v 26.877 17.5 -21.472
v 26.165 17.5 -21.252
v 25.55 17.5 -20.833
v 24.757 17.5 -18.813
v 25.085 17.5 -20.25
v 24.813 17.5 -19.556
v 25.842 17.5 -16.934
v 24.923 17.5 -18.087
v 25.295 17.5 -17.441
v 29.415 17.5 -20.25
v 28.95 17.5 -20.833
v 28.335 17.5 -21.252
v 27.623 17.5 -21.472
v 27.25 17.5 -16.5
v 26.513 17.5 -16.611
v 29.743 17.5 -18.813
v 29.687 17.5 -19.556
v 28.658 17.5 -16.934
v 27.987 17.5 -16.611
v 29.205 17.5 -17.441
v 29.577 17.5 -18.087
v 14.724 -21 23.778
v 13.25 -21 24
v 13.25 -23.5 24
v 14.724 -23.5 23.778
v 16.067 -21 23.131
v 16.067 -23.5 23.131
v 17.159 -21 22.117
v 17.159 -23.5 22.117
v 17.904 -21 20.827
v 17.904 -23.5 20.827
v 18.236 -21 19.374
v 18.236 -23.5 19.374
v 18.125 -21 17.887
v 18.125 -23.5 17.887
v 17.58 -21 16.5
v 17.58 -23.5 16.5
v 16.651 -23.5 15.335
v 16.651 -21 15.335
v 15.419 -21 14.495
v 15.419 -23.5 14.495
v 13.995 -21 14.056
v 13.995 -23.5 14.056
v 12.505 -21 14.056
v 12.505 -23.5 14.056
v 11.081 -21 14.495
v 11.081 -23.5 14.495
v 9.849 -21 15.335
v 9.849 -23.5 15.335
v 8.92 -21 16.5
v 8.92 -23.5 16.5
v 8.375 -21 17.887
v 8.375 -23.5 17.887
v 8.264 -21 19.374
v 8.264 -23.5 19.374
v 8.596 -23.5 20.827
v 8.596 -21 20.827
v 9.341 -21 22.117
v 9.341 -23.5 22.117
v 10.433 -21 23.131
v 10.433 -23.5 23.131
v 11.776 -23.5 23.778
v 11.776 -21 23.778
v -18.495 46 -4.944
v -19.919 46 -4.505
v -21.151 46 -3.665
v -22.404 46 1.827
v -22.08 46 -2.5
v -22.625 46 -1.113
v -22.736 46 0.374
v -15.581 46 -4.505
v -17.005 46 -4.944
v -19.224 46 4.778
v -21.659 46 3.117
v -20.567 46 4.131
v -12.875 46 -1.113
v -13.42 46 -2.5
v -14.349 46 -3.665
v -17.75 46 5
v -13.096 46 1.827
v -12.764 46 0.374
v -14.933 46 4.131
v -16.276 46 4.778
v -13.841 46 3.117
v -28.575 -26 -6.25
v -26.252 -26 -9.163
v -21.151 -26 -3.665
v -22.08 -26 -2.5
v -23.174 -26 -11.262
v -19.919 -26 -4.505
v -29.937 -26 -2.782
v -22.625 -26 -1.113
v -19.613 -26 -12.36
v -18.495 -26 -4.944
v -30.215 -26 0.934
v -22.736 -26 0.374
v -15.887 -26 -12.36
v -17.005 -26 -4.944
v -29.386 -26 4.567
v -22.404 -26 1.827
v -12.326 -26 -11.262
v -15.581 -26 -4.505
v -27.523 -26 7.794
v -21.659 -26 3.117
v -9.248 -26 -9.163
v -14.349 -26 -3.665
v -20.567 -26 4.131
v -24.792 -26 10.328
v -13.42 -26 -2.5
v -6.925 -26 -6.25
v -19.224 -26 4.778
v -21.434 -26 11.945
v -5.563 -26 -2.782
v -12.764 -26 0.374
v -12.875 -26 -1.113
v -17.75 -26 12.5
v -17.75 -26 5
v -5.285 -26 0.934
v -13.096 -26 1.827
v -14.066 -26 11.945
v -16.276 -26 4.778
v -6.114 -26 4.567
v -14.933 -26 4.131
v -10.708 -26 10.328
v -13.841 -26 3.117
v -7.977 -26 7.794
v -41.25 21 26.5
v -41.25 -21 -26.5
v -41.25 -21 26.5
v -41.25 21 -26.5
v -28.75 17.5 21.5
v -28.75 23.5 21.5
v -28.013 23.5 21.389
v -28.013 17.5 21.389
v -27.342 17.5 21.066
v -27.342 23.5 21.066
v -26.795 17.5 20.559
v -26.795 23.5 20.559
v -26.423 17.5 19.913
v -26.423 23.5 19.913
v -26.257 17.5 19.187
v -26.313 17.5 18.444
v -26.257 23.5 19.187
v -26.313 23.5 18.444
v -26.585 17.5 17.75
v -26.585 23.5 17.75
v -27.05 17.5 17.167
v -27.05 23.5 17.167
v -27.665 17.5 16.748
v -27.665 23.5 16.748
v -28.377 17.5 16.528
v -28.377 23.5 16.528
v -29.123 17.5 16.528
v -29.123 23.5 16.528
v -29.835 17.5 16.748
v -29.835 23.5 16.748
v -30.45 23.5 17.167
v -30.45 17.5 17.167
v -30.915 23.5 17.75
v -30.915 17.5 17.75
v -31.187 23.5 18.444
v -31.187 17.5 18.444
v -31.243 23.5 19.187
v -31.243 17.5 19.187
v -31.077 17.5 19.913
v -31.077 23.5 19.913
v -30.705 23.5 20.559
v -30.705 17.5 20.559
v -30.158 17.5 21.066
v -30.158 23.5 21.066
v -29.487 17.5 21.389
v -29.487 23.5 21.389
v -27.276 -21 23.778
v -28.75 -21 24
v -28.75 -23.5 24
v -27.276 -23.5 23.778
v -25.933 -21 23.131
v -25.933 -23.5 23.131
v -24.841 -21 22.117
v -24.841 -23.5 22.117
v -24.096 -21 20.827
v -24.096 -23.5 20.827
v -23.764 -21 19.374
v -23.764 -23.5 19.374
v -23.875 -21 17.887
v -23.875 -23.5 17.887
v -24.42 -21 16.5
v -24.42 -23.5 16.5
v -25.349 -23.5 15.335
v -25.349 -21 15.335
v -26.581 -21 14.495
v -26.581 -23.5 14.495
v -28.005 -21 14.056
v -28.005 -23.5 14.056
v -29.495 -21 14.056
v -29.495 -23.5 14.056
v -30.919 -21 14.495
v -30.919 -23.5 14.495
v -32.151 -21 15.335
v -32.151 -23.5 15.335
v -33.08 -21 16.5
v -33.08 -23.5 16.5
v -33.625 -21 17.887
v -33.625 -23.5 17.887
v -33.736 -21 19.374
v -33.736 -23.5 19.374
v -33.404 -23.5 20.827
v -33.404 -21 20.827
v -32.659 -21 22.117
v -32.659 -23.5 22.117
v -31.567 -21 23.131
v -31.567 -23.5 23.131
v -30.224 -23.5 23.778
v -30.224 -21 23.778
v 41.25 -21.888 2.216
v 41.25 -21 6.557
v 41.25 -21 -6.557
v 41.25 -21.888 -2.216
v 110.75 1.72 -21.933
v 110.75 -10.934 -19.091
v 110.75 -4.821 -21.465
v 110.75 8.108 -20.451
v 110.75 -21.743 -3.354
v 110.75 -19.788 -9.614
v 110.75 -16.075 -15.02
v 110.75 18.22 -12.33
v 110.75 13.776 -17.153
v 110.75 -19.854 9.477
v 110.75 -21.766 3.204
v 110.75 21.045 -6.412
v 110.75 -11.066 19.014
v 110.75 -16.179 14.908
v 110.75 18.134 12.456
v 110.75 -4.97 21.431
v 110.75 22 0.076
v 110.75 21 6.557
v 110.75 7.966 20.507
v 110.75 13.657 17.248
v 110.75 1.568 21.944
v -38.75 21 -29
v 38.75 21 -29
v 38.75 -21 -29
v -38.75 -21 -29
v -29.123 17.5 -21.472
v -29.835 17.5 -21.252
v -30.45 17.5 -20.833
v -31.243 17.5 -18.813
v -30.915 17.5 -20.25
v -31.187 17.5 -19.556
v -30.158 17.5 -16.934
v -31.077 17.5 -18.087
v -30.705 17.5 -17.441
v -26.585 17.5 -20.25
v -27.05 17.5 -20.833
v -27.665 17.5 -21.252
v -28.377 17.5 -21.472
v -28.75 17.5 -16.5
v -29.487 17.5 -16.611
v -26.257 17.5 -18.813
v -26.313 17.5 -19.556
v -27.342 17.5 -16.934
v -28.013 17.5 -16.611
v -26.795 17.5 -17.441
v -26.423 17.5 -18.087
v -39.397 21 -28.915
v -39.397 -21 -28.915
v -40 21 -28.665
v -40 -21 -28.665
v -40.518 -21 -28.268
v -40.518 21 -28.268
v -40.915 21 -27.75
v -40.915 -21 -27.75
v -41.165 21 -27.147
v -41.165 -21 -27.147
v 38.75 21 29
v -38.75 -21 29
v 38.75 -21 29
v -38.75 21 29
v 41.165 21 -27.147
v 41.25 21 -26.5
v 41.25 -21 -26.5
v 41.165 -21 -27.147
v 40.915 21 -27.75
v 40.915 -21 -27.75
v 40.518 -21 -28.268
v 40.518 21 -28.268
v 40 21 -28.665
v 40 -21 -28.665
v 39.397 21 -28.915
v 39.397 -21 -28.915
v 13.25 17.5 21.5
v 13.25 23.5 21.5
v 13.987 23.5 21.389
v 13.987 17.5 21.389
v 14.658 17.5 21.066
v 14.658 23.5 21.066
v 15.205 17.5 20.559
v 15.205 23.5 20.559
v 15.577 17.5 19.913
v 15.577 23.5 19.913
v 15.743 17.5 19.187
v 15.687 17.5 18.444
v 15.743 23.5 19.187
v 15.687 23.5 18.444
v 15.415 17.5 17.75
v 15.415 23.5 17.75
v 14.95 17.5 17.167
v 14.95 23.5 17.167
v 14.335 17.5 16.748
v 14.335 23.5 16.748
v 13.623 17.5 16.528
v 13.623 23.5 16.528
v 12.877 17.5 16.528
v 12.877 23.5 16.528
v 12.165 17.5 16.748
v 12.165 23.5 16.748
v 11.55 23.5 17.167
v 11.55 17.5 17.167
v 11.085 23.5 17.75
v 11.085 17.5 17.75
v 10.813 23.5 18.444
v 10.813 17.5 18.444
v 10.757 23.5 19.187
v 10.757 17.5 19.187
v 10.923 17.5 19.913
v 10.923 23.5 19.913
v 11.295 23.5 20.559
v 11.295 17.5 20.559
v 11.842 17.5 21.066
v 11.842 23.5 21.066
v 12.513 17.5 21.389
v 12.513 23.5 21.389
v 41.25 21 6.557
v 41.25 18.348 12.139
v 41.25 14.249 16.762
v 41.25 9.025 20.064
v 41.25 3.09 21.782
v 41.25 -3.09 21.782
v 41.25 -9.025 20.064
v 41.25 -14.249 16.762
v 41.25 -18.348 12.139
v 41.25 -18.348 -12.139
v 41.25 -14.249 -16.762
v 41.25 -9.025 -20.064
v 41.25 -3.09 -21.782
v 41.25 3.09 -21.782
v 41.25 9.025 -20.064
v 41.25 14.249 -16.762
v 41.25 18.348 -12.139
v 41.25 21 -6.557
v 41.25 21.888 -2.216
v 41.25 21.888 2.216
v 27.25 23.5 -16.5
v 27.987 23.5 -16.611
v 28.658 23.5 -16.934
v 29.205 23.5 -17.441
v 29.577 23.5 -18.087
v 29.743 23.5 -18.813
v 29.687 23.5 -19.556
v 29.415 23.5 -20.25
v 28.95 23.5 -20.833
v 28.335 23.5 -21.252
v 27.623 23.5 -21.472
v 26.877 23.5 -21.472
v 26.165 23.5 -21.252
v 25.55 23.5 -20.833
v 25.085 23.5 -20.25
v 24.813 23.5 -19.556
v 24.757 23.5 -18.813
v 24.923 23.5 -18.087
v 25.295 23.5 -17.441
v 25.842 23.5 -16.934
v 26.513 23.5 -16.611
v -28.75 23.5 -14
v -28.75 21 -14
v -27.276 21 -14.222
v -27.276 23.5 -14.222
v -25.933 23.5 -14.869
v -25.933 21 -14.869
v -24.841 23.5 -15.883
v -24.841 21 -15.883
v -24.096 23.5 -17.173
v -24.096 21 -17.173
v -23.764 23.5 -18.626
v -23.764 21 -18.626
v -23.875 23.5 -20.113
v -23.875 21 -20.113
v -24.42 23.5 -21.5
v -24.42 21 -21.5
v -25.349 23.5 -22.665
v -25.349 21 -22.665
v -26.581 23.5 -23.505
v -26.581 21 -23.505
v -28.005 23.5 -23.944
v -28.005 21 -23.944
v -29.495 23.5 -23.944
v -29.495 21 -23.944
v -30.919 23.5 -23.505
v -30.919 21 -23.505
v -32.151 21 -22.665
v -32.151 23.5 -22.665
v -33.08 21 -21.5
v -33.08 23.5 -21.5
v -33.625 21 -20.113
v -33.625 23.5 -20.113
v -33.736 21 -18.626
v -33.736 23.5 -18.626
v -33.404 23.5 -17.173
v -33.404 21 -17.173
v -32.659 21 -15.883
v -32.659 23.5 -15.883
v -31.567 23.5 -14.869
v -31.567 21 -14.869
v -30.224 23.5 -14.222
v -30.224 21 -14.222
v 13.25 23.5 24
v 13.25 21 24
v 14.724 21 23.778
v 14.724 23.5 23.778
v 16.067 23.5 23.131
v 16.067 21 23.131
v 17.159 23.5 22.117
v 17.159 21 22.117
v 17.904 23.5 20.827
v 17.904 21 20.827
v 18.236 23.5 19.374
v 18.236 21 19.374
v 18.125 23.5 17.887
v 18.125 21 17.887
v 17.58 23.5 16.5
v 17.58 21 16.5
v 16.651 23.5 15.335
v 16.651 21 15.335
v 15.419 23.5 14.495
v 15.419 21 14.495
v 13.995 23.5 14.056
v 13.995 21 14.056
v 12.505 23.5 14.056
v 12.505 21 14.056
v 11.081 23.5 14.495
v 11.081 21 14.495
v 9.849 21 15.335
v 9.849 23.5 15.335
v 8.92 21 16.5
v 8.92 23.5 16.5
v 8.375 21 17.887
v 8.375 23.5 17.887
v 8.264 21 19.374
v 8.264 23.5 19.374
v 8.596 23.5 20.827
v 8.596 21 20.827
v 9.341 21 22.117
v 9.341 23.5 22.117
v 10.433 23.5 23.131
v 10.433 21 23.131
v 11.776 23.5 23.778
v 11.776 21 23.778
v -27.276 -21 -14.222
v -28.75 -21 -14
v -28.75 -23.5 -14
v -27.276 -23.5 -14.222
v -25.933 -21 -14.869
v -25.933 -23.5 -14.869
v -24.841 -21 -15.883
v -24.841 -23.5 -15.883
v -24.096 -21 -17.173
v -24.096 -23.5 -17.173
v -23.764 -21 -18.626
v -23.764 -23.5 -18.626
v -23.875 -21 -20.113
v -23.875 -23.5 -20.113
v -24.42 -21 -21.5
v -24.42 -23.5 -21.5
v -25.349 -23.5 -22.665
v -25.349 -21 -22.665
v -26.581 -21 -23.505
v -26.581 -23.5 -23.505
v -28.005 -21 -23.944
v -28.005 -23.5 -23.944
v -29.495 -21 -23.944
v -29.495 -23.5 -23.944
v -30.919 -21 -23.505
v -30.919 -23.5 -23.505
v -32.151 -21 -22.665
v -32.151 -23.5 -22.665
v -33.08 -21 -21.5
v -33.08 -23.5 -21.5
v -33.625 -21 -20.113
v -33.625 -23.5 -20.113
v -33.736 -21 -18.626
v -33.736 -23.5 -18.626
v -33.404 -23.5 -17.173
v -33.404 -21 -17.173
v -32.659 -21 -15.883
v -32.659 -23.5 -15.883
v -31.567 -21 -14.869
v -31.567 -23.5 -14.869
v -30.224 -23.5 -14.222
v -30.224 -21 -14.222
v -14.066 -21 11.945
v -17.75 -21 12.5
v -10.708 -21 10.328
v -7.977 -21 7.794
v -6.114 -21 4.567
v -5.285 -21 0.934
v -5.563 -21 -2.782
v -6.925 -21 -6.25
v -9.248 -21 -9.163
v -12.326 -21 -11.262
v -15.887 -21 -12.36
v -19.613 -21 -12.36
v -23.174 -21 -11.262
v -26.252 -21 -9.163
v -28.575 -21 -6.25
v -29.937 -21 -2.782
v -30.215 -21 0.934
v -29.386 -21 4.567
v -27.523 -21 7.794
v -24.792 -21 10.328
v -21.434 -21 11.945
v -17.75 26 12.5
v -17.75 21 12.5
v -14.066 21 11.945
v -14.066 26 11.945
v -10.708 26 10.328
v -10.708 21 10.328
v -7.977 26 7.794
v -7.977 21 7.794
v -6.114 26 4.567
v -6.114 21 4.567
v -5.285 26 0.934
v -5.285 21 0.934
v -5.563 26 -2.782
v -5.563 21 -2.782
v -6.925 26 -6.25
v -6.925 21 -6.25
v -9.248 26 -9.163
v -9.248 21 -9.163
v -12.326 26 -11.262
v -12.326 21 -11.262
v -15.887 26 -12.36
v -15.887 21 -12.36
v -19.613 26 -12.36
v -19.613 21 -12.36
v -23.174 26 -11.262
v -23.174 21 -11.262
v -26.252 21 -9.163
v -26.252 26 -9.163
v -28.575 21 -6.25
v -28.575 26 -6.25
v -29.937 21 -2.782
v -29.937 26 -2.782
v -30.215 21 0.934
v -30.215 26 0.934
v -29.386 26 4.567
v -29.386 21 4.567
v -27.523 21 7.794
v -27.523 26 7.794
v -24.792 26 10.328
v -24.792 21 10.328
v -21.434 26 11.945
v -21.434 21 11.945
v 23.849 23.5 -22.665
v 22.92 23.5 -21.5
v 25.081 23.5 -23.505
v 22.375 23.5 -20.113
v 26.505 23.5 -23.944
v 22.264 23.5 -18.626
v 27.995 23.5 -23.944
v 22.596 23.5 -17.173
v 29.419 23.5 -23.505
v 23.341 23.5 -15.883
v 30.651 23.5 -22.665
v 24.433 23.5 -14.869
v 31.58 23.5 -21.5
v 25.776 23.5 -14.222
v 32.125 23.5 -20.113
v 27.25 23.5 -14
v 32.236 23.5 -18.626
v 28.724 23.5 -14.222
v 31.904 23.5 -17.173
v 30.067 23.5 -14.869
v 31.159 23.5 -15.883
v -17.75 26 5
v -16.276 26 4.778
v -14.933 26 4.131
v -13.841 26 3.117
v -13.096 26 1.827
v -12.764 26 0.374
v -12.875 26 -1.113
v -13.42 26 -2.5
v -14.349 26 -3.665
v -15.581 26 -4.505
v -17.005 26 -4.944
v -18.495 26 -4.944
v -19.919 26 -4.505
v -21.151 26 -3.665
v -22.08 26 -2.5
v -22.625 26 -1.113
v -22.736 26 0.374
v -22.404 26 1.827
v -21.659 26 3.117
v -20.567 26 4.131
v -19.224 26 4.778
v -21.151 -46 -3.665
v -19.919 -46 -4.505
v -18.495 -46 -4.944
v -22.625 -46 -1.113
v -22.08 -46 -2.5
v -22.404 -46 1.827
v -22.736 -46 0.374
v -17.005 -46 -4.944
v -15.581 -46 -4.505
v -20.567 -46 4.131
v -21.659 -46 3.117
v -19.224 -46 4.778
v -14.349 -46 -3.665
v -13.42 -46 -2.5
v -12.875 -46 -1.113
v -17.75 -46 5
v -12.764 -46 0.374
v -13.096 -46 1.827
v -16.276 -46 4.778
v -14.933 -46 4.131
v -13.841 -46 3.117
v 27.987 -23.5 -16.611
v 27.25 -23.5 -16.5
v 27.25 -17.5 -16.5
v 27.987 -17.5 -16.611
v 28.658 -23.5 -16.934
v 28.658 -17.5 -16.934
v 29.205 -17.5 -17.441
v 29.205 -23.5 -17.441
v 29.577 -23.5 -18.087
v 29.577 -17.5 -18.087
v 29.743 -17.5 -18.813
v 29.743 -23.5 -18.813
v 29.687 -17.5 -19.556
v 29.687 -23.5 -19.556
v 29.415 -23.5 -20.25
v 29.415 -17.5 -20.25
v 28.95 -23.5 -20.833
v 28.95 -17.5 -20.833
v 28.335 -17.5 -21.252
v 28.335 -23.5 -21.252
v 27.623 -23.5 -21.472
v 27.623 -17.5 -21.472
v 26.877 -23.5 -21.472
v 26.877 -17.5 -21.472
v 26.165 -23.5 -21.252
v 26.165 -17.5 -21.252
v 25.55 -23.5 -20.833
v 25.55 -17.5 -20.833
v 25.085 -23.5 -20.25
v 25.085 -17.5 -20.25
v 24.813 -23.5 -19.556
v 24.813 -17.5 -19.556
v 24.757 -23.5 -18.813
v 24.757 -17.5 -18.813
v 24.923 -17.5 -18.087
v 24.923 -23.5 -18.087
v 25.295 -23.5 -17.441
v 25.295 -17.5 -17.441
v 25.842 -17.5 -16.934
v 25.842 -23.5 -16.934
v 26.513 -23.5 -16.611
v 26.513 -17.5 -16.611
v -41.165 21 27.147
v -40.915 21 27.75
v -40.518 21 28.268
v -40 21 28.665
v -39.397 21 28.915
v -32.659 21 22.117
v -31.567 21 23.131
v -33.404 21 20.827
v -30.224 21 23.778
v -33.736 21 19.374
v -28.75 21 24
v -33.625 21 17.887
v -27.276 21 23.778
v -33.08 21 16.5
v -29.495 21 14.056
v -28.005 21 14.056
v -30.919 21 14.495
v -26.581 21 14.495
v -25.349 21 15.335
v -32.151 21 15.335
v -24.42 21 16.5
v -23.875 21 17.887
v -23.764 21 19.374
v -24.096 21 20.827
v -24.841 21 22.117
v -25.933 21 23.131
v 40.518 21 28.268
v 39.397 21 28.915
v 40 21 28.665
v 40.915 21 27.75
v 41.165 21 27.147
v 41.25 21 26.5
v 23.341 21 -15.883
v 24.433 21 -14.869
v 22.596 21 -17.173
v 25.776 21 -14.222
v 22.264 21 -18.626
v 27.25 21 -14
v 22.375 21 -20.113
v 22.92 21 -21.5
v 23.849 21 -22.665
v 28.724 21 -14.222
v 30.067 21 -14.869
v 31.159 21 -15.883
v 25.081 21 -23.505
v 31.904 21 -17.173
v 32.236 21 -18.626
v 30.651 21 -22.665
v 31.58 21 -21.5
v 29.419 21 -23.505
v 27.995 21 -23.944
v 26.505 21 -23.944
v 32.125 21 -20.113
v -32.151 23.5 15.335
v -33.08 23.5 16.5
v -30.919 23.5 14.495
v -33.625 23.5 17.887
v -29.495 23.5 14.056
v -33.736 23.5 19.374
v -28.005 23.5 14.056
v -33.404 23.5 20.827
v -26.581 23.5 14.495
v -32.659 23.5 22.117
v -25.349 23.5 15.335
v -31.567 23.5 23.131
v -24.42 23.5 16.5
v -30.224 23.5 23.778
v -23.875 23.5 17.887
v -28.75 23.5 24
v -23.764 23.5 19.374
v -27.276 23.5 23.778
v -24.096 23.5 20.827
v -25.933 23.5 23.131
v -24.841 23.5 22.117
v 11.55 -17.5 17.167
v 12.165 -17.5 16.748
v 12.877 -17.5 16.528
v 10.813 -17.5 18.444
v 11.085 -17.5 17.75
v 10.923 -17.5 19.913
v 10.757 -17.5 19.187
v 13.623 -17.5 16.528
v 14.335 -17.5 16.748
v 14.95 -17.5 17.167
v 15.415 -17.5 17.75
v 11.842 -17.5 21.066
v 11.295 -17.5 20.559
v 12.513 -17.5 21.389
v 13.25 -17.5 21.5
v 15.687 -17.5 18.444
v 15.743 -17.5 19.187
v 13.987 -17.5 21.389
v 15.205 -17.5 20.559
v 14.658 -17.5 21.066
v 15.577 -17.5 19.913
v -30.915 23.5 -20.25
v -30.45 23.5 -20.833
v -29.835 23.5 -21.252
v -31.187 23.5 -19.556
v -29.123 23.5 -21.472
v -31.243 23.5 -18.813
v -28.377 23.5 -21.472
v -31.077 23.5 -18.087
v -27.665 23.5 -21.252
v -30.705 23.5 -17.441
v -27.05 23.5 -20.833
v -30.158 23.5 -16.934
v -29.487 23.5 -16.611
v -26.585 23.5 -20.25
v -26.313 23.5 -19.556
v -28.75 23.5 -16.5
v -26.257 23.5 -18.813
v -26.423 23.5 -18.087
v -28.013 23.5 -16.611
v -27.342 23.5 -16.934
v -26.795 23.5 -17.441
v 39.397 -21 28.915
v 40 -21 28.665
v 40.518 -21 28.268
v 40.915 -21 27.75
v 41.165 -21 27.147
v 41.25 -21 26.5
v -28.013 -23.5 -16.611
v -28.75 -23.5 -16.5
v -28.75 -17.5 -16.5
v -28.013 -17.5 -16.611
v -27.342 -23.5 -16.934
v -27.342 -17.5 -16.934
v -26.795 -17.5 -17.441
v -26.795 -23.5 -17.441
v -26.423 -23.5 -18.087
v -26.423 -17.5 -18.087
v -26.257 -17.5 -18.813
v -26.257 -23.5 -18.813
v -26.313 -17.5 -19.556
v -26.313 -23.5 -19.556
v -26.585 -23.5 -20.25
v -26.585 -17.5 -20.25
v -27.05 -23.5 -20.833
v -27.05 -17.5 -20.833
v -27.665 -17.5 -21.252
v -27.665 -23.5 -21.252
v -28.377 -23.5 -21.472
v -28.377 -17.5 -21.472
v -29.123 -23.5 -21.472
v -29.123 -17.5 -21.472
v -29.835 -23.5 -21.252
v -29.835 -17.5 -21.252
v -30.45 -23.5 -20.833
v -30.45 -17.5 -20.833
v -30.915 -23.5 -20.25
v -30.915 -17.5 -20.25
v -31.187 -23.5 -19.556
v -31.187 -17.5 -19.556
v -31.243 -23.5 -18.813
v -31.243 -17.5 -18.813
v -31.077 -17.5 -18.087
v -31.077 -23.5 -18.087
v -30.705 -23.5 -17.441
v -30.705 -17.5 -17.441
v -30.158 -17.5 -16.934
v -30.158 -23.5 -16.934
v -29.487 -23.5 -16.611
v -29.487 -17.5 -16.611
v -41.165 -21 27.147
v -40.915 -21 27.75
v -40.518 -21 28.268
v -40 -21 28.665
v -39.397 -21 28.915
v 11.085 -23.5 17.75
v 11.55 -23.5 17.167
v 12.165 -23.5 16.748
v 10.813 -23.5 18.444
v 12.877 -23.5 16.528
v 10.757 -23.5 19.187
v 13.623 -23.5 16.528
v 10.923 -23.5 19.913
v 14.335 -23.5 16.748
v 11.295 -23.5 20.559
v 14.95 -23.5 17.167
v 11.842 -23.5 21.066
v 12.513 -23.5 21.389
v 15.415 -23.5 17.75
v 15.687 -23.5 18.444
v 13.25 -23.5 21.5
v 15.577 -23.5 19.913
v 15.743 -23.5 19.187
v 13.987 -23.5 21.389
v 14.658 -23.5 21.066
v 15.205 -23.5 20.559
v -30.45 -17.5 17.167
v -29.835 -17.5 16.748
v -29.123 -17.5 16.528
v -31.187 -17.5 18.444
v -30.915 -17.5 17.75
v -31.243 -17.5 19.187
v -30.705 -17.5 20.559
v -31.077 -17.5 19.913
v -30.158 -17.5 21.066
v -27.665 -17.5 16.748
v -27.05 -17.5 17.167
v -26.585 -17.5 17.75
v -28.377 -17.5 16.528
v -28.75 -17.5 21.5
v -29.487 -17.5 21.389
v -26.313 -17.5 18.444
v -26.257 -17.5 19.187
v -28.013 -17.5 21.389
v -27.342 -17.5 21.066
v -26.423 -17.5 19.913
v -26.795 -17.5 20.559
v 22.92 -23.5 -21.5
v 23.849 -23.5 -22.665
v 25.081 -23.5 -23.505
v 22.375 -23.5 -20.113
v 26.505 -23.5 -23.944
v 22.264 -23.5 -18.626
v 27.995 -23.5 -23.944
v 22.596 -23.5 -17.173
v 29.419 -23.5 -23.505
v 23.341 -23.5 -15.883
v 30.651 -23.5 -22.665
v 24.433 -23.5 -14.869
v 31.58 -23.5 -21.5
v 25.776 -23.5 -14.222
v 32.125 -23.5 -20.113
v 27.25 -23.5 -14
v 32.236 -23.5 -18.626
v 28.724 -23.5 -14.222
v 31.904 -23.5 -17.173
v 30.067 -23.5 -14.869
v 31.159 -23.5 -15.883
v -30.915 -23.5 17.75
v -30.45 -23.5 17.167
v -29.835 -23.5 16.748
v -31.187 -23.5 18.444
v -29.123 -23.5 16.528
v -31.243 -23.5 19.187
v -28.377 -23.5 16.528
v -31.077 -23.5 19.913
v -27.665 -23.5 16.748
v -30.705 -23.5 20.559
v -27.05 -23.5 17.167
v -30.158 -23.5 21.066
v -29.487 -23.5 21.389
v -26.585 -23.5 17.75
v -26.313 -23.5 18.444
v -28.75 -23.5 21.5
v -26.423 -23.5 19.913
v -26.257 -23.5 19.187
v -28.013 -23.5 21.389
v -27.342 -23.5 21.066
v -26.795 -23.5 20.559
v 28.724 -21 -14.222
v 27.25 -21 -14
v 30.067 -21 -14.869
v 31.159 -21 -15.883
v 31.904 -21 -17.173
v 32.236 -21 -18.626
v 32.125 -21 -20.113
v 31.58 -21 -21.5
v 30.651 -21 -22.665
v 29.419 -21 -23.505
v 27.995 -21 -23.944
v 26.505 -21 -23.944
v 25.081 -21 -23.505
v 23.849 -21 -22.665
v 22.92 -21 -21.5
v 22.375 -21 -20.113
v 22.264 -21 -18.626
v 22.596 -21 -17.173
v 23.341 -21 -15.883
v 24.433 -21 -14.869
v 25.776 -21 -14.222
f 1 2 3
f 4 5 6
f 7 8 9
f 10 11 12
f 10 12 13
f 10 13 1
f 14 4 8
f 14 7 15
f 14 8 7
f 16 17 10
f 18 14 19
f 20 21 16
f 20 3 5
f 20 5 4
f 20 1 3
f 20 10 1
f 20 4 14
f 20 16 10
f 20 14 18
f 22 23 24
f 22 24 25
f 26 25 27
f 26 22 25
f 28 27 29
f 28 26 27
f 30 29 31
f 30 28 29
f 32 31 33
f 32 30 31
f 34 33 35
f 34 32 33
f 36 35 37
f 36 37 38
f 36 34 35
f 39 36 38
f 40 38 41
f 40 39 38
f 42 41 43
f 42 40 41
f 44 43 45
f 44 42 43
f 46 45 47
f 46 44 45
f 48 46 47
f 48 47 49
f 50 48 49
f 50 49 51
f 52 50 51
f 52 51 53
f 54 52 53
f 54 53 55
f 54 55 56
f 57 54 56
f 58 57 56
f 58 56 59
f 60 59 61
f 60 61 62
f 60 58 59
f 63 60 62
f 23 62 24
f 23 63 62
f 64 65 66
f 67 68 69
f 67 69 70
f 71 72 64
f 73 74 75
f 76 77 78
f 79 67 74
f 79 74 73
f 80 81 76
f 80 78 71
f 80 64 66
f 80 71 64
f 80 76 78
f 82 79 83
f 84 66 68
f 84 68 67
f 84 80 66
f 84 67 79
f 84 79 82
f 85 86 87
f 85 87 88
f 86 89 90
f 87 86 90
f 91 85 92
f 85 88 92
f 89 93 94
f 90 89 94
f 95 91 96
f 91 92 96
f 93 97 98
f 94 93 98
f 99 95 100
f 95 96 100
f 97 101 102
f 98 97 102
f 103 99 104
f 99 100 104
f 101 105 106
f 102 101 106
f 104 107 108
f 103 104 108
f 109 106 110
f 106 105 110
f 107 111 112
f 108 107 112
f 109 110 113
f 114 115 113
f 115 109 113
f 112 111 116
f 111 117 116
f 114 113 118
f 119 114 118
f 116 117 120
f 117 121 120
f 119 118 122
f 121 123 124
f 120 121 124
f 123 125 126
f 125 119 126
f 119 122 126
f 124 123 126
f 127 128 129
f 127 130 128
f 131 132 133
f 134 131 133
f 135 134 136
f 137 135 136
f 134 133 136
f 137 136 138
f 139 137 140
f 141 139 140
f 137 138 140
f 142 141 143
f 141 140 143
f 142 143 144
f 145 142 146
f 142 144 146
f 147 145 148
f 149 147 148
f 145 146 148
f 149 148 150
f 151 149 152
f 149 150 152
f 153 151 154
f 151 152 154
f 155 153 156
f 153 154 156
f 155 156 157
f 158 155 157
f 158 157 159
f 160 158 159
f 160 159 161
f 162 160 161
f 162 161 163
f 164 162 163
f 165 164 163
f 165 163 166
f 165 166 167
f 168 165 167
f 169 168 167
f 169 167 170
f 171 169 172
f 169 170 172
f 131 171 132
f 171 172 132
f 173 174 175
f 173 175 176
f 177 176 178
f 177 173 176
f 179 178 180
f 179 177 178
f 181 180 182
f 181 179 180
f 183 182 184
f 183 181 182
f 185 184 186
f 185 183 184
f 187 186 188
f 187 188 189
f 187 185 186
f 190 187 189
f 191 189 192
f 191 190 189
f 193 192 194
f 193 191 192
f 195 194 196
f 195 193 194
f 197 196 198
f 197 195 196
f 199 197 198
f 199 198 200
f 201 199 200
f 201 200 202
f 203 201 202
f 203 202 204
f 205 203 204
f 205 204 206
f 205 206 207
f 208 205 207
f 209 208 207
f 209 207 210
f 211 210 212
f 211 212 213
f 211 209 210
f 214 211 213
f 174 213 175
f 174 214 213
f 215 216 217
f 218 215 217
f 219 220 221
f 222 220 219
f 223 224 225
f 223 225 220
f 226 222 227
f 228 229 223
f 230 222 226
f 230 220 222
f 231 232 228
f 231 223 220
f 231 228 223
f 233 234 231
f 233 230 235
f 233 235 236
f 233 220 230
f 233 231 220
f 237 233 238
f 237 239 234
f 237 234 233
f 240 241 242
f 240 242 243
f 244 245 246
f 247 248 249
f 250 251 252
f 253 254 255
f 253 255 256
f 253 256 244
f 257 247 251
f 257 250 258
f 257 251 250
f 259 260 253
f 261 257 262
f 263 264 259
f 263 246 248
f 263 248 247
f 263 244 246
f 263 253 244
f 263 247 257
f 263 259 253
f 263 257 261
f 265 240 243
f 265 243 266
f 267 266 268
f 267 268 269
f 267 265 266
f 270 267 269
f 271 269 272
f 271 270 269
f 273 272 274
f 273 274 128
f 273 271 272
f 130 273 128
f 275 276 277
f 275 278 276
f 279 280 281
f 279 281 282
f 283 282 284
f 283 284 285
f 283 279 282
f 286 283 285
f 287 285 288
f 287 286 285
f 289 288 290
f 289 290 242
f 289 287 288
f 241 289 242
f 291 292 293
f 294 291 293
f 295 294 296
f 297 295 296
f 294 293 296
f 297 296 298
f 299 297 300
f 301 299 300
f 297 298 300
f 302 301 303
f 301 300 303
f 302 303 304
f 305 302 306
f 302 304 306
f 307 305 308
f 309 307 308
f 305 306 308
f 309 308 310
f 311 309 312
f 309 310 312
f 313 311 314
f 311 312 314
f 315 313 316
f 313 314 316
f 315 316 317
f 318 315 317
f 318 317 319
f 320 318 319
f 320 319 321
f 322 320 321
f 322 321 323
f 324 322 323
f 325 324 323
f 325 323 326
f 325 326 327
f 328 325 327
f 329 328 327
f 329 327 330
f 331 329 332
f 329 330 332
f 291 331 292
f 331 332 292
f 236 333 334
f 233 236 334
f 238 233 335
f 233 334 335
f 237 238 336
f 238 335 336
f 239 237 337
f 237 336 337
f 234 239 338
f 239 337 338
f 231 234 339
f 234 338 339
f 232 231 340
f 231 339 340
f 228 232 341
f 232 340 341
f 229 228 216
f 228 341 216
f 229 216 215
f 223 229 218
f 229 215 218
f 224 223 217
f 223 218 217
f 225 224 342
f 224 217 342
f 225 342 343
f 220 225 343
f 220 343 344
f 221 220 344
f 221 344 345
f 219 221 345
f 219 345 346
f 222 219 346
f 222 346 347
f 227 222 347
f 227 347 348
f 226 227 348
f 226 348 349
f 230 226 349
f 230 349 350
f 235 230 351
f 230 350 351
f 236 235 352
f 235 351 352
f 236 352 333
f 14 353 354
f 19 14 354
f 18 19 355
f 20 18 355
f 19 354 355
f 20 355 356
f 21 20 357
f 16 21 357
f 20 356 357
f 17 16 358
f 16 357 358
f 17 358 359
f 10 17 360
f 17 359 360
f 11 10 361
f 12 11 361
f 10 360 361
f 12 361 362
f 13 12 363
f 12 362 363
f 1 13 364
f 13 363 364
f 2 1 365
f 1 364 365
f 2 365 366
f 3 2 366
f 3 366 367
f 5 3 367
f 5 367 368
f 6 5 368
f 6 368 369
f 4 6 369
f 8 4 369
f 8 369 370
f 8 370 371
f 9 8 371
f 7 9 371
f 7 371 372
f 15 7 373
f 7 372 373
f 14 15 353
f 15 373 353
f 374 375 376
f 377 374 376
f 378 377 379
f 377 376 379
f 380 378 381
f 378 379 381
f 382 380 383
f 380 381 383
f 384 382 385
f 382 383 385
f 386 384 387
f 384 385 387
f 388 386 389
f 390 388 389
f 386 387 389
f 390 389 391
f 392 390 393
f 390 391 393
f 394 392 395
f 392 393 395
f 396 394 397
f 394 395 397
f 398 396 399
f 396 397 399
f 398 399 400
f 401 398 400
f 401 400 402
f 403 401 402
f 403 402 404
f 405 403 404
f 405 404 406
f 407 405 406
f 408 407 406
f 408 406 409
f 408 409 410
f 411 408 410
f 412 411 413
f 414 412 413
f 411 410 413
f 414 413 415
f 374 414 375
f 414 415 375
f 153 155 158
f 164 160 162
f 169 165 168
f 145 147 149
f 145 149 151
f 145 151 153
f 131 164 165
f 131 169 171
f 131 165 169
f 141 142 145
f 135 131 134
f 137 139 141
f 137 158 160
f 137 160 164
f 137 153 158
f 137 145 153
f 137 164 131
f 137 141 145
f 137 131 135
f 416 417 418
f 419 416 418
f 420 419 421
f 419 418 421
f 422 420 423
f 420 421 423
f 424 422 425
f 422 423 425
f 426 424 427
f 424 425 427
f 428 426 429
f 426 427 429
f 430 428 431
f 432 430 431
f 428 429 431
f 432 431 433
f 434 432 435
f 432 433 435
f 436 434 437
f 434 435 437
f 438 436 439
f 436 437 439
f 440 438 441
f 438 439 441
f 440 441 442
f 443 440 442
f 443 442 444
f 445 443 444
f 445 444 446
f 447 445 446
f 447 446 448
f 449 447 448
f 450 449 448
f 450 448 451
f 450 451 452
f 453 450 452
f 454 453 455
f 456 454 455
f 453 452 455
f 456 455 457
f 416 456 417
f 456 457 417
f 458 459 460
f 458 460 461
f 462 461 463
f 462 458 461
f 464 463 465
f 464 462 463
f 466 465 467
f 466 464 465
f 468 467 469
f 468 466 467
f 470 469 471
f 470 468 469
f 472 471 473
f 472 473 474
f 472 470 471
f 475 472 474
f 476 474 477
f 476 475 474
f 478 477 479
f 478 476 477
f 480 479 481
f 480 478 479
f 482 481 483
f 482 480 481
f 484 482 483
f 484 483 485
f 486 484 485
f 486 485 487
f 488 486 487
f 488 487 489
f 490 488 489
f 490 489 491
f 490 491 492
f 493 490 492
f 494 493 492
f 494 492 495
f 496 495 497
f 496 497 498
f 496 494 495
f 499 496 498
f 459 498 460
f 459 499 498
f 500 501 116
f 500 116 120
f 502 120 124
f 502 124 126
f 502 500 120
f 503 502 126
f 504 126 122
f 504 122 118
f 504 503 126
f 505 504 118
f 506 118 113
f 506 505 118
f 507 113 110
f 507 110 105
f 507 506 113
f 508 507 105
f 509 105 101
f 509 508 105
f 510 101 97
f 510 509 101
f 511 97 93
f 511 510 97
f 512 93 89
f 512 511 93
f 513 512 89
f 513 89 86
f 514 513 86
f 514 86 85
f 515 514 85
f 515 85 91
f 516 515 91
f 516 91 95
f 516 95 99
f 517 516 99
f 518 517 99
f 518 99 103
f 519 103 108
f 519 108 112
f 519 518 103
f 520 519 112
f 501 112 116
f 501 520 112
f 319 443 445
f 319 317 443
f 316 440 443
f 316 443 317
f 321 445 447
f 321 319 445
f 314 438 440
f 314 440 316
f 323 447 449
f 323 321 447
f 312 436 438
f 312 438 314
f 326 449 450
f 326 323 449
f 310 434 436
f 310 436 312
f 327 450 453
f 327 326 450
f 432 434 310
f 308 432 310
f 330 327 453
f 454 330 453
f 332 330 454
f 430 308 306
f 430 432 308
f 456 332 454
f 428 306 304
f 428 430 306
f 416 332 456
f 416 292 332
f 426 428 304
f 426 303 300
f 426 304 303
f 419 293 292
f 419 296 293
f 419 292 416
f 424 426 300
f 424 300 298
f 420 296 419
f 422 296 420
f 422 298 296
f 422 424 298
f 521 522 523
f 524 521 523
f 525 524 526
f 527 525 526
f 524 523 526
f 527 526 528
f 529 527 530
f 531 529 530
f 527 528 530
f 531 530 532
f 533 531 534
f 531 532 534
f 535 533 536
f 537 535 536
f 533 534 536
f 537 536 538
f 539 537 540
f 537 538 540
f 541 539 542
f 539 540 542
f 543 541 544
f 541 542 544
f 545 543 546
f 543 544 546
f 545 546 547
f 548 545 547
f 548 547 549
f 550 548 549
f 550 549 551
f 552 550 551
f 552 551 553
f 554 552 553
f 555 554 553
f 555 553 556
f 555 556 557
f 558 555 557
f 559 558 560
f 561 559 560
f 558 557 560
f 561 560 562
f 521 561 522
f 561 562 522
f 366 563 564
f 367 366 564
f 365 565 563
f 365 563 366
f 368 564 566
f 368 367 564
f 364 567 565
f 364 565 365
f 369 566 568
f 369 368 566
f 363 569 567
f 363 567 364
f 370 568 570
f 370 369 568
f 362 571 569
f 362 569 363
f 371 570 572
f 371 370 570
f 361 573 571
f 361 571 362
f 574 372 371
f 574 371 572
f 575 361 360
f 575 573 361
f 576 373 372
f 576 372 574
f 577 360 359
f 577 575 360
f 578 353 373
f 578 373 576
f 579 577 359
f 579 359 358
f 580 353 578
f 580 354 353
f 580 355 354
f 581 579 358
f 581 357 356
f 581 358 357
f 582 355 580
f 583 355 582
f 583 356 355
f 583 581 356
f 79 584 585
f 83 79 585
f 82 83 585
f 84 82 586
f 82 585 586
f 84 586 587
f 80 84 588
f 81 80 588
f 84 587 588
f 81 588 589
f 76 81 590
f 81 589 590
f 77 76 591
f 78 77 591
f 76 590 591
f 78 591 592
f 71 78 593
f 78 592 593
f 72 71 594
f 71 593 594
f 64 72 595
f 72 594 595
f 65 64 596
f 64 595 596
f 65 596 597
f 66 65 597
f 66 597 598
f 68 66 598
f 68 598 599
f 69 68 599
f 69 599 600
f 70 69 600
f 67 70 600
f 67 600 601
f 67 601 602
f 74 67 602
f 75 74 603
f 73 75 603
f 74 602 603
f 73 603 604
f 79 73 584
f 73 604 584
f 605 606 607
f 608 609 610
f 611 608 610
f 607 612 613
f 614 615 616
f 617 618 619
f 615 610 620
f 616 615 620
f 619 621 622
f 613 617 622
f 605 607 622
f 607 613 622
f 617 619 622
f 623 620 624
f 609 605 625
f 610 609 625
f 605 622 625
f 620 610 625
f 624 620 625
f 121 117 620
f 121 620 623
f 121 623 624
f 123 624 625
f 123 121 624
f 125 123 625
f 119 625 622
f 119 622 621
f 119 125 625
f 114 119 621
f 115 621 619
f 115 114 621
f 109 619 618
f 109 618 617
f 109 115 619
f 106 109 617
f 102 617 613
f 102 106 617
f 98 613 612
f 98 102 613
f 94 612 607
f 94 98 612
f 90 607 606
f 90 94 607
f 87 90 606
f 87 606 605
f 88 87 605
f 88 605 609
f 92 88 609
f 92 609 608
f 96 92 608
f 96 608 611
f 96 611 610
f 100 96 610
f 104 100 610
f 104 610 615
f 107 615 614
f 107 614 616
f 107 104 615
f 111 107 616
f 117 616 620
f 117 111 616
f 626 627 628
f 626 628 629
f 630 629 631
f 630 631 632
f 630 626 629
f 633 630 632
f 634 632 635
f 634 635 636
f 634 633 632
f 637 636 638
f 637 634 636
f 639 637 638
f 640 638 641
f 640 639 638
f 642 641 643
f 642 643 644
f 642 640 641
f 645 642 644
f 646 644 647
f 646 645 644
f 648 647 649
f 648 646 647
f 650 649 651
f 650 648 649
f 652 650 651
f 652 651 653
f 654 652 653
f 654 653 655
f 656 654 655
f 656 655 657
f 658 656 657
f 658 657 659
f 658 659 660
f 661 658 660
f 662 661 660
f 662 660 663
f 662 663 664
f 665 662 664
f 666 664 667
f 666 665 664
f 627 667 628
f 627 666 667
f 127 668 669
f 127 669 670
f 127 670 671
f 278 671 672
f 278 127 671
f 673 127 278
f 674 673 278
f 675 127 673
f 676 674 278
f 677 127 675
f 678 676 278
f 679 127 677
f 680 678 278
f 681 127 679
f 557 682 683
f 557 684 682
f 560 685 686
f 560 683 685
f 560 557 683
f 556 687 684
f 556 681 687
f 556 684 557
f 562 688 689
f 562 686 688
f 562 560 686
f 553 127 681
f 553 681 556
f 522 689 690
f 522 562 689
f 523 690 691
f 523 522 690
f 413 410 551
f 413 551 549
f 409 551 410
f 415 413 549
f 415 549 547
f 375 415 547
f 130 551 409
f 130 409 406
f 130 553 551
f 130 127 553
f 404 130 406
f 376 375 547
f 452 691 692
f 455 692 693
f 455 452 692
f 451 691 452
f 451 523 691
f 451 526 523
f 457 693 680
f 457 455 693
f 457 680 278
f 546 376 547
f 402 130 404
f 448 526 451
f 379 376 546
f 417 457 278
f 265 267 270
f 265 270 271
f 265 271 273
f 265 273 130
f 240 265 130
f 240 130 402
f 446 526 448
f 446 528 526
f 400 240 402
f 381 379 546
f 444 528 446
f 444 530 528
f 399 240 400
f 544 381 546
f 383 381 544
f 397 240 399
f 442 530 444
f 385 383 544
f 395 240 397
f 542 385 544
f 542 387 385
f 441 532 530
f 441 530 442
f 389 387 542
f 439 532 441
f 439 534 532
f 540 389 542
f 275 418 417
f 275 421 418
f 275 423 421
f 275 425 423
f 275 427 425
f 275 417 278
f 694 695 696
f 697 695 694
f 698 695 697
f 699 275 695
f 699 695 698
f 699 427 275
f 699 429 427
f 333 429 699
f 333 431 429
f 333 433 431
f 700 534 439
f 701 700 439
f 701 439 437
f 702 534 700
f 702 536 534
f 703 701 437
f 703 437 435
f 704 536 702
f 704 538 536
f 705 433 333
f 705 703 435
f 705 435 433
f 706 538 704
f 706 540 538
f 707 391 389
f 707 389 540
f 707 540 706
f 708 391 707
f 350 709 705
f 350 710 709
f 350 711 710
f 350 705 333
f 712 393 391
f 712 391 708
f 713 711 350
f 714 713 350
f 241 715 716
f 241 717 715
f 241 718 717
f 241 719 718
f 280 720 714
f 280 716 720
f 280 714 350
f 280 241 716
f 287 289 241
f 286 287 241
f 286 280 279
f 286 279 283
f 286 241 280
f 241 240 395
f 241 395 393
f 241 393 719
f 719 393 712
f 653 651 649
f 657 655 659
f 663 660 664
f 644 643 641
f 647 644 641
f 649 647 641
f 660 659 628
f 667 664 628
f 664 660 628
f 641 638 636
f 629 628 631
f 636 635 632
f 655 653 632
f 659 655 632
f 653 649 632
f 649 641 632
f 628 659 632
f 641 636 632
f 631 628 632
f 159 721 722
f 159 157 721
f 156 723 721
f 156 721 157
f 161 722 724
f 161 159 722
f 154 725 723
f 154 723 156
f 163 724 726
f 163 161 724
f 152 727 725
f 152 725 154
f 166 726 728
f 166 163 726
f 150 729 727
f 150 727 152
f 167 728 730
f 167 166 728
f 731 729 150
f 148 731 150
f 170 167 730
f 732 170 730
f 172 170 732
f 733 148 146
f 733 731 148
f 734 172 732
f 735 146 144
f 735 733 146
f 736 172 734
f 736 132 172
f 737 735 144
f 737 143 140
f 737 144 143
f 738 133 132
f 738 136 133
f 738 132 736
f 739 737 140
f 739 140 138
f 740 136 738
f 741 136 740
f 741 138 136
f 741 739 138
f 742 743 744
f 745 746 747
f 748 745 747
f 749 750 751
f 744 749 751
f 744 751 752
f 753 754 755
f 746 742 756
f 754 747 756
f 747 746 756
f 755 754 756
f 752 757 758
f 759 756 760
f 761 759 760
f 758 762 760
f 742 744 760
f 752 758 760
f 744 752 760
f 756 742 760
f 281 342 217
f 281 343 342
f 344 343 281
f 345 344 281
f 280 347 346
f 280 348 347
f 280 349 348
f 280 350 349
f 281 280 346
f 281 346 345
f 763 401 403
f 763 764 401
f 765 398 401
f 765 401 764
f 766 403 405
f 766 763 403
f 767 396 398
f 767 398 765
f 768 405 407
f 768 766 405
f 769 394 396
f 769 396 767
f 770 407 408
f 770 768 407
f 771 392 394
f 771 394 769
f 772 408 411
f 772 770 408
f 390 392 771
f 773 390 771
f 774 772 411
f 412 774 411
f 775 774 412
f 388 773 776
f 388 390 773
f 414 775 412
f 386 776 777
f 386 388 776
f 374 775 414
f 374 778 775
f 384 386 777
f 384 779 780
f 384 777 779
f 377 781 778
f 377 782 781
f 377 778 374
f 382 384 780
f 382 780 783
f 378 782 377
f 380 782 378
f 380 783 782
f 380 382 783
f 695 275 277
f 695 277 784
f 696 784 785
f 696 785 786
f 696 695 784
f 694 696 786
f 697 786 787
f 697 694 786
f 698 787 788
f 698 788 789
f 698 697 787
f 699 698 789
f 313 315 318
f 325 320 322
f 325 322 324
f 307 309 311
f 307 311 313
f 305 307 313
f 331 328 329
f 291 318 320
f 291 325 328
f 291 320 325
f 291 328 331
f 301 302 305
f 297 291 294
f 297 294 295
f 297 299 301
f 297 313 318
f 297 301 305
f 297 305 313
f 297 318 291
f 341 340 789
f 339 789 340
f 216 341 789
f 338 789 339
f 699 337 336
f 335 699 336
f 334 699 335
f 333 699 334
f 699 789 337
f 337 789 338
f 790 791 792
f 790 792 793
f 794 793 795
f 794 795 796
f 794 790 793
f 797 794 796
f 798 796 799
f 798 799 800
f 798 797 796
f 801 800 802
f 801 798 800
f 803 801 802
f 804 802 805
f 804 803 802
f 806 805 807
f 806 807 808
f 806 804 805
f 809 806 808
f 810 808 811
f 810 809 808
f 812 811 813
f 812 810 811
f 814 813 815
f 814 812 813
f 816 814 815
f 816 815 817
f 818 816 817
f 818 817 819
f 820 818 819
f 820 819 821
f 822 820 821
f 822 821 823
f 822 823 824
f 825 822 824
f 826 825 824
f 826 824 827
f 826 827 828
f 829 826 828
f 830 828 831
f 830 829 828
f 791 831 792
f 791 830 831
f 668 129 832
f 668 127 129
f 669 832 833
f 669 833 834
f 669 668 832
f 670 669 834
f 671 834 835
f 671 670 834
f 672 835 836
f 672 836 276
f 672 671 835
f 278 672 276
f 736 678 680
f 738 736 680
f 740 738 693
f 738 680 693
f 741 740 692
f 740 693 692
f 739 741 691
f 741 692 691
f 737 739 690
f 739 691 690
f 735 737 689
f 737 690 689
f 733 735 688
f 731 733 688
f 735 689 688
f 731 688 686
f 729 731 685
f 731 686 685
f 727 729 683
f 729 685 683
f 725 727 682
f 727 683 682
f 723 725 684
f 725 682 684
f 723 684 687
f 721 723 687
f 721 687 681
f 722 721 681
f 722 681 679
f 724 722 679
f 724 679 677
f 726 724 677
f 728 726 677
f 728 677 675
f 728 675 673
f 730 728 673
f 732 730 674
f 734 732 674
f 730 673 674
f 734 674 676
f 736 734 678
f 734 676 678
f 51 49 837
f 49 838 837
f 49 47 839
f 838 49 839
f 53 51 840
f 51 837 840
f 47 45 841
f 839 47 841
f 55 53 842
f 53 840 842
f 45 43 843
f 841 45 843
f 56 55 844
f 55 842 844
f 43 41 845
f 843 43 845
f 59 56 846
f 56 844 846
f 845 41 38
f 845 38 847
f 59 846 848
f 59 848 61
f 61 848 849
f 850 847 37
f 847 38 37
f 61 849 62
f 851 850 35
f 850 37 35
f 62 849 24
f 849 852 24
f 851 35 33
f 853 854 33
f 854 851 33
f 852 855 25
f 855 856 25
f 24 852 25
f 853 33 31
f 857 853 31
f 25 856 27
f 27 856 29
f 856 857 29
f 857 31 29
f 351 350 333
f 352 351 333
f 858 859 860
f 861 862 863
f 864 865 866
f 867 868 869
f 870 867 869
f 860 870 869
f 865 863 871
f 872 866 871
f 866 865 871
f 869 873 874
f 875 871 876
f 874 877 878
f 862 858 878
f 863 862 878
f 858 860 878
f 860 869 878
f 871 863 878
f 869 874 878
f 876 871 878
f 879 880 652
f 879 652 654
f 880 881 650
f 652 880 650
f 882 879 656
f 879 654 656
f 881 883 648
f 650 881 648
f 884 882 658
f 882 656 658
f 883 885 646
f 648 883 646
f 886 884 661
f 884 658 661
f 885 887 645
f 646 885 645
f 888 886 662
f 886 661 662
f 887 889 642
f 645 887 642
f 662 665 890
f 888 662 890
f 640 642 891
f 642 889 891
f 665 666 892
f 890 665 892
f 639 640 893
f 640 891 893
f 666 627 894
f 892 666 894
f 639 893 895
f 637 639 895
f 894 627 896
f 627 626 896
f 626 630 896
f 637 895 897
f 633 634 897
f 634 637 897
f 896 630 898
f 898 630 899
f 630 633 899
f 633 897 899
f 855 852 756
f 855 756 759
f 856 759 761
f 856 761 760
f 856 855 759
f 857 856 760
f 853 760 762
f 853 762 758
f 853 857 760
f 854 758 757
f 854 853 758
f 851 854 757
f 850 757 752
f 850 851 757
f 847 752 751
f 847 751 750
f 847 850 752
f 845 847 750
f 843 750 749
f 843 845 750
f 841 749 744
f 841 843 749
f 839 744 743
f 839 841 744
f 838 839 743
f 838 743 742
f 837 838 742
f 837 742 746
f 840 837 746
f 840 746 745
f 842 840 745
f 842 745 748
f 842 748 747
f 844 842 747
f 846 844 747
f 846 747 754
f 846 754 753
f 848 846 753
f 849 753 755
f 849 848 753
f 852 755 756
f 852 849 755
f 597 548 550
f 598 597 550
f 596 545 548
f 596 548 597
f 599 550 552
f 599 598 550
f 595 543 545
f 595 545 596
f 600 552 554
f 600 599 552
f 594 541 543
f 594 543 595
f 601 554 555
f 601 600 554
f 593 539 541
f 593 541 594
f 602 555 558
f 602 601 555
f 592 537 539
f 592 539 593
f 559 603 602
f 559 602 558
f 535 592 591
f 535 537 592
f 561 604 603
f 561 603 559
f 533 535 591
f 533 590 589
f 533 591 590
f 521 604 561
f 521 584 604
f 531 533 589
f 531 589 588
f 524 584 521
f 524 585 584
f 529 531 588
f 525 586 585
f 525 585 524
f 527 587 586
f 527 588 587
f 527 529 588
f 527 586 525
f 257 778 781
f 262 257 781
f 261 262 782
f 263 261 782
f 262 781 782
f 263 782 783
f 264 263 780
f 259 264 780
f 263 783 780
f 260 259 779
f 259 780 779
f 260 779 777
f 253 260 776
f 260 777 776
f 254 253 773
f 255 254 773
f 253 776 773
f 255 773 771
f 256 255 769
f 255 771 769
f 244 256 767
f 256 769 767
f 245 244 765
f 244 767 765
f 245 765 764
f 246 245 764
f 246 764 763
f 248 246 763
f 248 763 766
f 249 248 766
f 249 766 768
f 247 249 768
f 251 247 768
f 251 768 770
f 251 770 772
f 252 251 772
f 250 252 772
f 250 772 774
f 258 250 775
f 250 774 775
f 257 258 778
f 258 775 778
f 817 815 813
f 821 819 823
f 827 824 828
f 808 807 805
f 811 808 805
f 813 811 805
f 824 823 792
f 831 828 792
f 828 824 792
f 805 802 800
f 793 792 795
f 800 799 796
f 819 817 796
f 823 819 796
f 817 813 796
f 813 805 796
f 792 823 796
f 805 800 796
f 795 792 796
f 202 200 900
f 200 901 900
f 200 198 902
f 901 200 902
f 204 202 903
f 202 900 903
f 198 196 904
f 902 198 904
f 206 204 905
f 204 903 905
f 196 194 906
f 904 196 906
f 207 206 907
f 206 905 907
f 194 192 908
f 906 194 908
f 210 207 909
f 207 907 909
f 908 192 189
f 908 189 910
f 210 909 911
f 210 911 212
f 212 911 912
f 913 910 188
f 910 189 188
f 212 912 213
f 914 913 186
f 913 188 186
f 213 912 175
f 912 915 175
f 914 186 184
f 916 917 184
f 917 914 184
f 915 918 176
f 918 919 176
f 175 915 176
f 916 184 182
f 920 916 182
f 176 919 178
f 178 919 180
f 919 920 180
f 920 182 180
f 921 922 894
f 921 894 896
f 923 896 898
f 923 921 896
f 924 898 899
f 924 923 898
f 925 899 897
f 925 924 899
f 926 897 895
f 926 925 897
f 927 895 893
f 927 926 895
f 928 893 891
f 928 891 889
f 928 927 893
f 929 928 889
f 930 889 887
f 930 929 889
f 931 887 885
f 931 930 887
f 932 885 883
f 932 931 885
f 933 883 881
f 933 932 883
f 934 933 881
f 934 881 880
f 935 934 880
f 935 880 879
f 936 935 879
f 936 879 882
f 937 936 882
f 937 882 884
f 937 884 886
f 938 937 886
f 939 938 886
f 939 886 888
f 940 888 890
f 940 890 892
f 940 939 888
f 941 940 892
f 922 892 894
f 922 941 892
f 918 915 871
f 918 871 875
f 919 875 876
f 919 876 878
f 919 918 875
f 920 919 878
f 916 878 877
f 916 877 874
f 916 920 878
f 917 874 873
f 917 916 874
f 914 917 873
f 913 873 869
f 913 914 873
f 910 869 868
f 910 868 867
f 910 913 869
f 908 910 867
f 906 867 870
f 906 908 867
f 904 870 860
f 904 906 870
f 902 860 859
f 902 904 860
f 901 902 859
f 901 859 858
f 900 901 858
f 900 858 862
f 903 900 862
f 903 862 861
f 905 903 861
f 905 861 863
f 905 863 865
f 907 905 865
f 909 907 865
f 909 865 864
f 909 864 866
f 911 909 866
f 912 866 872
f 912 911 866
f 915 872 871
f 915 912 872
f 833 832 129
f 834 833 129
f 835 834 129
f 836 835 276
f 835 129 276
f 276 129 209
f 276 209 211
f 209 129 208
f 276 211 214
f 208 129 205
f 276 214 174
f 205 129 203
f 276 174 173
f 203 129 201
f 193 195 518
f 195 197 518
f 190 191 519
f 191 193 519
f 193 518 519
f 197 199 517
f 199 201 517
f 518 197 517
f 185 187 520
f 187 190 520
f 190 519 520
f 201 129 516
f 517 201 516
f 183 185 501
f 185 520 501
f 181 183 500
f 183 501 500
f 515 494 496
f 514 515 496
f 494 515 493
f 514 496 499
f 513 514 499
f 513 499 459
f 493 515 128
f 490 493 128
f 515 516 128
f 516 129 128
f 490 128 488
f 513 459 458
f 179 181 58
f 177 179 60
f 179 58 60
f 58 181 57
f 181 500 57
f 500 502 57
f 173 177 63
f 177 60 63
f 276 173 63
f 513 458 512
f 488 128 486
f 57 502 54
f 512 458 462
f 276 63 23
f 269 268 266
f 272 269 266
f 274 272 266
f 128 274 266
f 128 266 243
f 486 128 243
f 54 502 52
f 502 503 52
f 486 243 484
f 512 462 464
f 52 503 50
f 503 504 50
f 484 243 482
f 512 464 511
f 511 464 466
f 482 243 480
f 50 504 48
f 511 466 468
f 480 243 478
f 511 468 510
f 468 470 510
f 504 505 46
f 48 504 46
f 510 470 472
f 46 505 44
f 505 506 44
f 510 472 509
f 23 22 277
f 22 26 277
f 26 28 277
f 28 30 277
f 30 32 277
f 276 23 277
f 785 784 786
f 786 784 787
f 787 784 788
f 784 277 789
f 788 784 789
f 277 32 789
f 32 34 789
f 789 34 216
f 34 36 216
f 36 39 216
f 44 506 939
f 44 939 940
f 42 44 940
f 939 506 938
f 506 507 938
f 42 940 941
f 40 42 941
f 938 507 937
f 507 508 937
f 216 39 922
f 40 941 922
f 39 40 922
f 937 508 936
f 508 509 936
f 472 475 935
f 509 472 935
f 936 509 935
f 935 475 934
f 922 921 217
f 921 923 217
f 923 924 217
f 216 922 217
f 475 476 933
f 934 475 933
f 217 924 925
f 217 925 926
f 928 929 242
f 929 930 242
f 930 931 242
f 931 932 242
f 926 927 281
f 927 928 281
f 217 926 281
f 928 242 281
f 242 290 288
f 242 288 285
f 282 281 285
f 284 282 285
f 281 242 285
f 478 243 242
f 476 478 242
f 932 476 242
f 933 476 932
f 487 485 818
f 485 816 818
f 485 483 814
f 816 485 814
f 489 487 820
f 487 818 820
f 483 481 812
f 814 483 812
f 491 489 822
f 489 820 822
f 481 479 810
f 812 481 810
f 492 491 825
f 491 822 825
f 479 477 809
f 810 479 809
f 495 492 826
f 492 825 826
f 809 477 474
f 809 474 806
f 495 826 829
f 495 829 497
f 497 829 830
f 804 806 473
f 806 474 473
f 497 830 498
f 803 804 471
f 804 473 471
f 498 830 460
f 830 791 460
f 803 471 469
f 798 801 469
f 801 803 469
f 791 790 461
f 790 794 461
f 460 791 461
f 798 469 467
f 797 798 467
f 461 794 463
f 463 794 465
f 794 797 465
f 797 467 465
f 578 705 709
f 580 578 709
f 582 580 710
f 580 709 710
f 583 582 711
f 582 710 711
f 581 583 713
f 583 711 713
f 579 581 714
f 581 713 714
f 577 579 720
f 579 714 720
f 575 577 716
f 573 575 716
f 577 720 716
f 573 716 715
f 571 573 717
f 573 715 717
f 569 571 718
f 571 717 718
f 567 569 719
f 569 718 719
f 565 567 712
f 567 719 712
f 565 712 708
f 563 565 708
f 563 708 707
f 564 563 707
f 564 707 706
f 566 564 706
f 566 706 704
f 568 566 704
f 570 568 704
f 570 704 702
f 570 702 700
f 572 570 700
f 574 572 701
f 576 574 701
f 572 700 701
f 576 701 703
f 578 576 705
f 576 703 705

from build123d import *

# Parameters (mm, degrees)
BOSS_EXTRUDE1_DEPTH = 21
SKETCH2_R           = 5
BOSS_EXTRUDE2_DEPTH = 2.5
SKETCH3_R           = 2.5
CUT_EXTRUDE1_DEPTH  = 6
SKETCH6_R           = 12.5
BOSS_EXTRUDE5_DEPTH = 5
SKETCH4_R           = 5
BOSS_EXTRUDE3_DEPTH = 20
SKETCH5_R           = 22
BOSS_EXTRUDE4_DEPTH = 69.5


with BuildPart() as part:
    # Sketch1 → Boss-Extrude1 (new, symmetric)
    with BuildSketch(Plane(origin=(0, 0, 0), x_dir=(1, 0, 0), z_dir=(0, 1, 0))):
        with BuildLine():
            Line((-38.75, -29), (38.75, -29))
            ThreePointArc((38.75, -29), (40.517766953, -28.267766953), (41.25, -26.5))
            Line((41.25, -26.5), (41.25, 26.5))
            ThreePointArc((41.25, 26.5), (40.517766953, 28.267766953), (38.75, 29))
            Line((38.75, 29), (-38.75, 29))
            ThreePointArc((-38.75, 29), (-40.517766953, 28.267766953), (-41.25, 26.5))
            Line((-41.25, 26.5), (-41.25, -26.5))
            ThreePointArc((-41.25, -26.5), (-40.517766953, -28.267766953), (-38.75, -29))
        make_face()
    extrude(amount=BOSS_EXTRUDE1_DEPTH, both=True)

    # Sketch2 → Boss-Extrude2 (add)
    with BuildSketch(Plane(origin=(0, 21, 0), x_dir=(1, 0, 0), z_dir=(0, 1, 0))):
        with Locations(Location((-28.75, 19, 0), (0, 0, 270))):
            Circle(SKETCH2_R)
        with Locations(Location((-28.75, -19, 0), (0, 0, 270))):
            Circle(SKETCH2_R)
        with Locations(Location((13.25, -19, 0), (0, 0, 270))):
            Circle(SKETCH2_R)
        with Locations(Location((27.25, 19, 0), (0, 0, 270))):
            Circle(SKETCH2_R)
    boss_extrude2 = extrude(amount=BOSS_EXTRUDE2_DEPTH)

    # Sketch3 → Cut-Extrude1 (cut)
    with BuildSketch(Plane(origin=(0, 23.5, 0), x_dir=(1, 0, 0), z_dir=(0, 1, 0))):
        with Locations(Location((-28.75, 19, 0), (0, 0, 270))):
            Circle(SKETCH3_R)
        with Locations(Location((27.25, 19, 0), (0, 0, 270))):
            Circle(SKETCH3_R)
        with Locations(Location((13.25, -19, 0), (0, 0, 270))):
            Circle(SKETCH3_R)
        with Locations(Location((-28.75, -19, 0), (0, 0, 270))):
            Circle(SKETCH3_R)
    cut_extrude1 = extrude(amount=-CUT_EXTRUDE1_DEPTH, mode=Mode.SUBTRACT)

    # Sketch6 → Boss-Extrude5 (add)
    with BuildSketch(Plane(origin=(0, 21, 0), x_dir=(1, 0, 0), z_dir=(0, 1, 0))):
        with Locations(Location((-17.75, 0, 0), (0, 0, 270))):
            Circle(SKETCH6_R)
    boss_extrude5 = extrude(amount=BOSS_EXTRUDE5_DEPTH)

    # Sketch4 → Boss-Extrude3 (add)
    with BuildSketch(Plane(origin=(0, 26, 0), x_dir=(1, 0, 0), z_dir=(0, 1, 0))):
        with Locations(Location((-17.75, 0, 0), (0, 0, 270))):
            Circle(SKETCH4_R)
    boss_extrude3 = extrude(amount=BOSS_EXTRUDE3_DEPTH)

    # Sketch5 → Boss-Extrude4 (add)
    with BuildSketch(Plane(origin=(41.25, 0, 0), x_dir=(0, 0, -1), z_dir=(1, 0, 0))):
        with Locations(Location((0, 0, 0), (0, 0, 107.341442803))):
            Circle(SKETCH5_R)
    extrude(amount=BOSS_EXTRUDE4_DEPTH)

    # Mirror2: Boss-Extrude2, Cut-Extrude1, Boss-Extrude5, Boss-Extrude3 across plane
    add(boss_extrude2.mirror(Plane.ZX))
    add(cut_extrude1.mirror(Plane.ZX), mode=Mode.SUBTRACT)
    add(boss_extrude5.mirror(Plane.ZX))
    add(boss_extrude3.mirror(Plane.ZX))


solid = part.part
